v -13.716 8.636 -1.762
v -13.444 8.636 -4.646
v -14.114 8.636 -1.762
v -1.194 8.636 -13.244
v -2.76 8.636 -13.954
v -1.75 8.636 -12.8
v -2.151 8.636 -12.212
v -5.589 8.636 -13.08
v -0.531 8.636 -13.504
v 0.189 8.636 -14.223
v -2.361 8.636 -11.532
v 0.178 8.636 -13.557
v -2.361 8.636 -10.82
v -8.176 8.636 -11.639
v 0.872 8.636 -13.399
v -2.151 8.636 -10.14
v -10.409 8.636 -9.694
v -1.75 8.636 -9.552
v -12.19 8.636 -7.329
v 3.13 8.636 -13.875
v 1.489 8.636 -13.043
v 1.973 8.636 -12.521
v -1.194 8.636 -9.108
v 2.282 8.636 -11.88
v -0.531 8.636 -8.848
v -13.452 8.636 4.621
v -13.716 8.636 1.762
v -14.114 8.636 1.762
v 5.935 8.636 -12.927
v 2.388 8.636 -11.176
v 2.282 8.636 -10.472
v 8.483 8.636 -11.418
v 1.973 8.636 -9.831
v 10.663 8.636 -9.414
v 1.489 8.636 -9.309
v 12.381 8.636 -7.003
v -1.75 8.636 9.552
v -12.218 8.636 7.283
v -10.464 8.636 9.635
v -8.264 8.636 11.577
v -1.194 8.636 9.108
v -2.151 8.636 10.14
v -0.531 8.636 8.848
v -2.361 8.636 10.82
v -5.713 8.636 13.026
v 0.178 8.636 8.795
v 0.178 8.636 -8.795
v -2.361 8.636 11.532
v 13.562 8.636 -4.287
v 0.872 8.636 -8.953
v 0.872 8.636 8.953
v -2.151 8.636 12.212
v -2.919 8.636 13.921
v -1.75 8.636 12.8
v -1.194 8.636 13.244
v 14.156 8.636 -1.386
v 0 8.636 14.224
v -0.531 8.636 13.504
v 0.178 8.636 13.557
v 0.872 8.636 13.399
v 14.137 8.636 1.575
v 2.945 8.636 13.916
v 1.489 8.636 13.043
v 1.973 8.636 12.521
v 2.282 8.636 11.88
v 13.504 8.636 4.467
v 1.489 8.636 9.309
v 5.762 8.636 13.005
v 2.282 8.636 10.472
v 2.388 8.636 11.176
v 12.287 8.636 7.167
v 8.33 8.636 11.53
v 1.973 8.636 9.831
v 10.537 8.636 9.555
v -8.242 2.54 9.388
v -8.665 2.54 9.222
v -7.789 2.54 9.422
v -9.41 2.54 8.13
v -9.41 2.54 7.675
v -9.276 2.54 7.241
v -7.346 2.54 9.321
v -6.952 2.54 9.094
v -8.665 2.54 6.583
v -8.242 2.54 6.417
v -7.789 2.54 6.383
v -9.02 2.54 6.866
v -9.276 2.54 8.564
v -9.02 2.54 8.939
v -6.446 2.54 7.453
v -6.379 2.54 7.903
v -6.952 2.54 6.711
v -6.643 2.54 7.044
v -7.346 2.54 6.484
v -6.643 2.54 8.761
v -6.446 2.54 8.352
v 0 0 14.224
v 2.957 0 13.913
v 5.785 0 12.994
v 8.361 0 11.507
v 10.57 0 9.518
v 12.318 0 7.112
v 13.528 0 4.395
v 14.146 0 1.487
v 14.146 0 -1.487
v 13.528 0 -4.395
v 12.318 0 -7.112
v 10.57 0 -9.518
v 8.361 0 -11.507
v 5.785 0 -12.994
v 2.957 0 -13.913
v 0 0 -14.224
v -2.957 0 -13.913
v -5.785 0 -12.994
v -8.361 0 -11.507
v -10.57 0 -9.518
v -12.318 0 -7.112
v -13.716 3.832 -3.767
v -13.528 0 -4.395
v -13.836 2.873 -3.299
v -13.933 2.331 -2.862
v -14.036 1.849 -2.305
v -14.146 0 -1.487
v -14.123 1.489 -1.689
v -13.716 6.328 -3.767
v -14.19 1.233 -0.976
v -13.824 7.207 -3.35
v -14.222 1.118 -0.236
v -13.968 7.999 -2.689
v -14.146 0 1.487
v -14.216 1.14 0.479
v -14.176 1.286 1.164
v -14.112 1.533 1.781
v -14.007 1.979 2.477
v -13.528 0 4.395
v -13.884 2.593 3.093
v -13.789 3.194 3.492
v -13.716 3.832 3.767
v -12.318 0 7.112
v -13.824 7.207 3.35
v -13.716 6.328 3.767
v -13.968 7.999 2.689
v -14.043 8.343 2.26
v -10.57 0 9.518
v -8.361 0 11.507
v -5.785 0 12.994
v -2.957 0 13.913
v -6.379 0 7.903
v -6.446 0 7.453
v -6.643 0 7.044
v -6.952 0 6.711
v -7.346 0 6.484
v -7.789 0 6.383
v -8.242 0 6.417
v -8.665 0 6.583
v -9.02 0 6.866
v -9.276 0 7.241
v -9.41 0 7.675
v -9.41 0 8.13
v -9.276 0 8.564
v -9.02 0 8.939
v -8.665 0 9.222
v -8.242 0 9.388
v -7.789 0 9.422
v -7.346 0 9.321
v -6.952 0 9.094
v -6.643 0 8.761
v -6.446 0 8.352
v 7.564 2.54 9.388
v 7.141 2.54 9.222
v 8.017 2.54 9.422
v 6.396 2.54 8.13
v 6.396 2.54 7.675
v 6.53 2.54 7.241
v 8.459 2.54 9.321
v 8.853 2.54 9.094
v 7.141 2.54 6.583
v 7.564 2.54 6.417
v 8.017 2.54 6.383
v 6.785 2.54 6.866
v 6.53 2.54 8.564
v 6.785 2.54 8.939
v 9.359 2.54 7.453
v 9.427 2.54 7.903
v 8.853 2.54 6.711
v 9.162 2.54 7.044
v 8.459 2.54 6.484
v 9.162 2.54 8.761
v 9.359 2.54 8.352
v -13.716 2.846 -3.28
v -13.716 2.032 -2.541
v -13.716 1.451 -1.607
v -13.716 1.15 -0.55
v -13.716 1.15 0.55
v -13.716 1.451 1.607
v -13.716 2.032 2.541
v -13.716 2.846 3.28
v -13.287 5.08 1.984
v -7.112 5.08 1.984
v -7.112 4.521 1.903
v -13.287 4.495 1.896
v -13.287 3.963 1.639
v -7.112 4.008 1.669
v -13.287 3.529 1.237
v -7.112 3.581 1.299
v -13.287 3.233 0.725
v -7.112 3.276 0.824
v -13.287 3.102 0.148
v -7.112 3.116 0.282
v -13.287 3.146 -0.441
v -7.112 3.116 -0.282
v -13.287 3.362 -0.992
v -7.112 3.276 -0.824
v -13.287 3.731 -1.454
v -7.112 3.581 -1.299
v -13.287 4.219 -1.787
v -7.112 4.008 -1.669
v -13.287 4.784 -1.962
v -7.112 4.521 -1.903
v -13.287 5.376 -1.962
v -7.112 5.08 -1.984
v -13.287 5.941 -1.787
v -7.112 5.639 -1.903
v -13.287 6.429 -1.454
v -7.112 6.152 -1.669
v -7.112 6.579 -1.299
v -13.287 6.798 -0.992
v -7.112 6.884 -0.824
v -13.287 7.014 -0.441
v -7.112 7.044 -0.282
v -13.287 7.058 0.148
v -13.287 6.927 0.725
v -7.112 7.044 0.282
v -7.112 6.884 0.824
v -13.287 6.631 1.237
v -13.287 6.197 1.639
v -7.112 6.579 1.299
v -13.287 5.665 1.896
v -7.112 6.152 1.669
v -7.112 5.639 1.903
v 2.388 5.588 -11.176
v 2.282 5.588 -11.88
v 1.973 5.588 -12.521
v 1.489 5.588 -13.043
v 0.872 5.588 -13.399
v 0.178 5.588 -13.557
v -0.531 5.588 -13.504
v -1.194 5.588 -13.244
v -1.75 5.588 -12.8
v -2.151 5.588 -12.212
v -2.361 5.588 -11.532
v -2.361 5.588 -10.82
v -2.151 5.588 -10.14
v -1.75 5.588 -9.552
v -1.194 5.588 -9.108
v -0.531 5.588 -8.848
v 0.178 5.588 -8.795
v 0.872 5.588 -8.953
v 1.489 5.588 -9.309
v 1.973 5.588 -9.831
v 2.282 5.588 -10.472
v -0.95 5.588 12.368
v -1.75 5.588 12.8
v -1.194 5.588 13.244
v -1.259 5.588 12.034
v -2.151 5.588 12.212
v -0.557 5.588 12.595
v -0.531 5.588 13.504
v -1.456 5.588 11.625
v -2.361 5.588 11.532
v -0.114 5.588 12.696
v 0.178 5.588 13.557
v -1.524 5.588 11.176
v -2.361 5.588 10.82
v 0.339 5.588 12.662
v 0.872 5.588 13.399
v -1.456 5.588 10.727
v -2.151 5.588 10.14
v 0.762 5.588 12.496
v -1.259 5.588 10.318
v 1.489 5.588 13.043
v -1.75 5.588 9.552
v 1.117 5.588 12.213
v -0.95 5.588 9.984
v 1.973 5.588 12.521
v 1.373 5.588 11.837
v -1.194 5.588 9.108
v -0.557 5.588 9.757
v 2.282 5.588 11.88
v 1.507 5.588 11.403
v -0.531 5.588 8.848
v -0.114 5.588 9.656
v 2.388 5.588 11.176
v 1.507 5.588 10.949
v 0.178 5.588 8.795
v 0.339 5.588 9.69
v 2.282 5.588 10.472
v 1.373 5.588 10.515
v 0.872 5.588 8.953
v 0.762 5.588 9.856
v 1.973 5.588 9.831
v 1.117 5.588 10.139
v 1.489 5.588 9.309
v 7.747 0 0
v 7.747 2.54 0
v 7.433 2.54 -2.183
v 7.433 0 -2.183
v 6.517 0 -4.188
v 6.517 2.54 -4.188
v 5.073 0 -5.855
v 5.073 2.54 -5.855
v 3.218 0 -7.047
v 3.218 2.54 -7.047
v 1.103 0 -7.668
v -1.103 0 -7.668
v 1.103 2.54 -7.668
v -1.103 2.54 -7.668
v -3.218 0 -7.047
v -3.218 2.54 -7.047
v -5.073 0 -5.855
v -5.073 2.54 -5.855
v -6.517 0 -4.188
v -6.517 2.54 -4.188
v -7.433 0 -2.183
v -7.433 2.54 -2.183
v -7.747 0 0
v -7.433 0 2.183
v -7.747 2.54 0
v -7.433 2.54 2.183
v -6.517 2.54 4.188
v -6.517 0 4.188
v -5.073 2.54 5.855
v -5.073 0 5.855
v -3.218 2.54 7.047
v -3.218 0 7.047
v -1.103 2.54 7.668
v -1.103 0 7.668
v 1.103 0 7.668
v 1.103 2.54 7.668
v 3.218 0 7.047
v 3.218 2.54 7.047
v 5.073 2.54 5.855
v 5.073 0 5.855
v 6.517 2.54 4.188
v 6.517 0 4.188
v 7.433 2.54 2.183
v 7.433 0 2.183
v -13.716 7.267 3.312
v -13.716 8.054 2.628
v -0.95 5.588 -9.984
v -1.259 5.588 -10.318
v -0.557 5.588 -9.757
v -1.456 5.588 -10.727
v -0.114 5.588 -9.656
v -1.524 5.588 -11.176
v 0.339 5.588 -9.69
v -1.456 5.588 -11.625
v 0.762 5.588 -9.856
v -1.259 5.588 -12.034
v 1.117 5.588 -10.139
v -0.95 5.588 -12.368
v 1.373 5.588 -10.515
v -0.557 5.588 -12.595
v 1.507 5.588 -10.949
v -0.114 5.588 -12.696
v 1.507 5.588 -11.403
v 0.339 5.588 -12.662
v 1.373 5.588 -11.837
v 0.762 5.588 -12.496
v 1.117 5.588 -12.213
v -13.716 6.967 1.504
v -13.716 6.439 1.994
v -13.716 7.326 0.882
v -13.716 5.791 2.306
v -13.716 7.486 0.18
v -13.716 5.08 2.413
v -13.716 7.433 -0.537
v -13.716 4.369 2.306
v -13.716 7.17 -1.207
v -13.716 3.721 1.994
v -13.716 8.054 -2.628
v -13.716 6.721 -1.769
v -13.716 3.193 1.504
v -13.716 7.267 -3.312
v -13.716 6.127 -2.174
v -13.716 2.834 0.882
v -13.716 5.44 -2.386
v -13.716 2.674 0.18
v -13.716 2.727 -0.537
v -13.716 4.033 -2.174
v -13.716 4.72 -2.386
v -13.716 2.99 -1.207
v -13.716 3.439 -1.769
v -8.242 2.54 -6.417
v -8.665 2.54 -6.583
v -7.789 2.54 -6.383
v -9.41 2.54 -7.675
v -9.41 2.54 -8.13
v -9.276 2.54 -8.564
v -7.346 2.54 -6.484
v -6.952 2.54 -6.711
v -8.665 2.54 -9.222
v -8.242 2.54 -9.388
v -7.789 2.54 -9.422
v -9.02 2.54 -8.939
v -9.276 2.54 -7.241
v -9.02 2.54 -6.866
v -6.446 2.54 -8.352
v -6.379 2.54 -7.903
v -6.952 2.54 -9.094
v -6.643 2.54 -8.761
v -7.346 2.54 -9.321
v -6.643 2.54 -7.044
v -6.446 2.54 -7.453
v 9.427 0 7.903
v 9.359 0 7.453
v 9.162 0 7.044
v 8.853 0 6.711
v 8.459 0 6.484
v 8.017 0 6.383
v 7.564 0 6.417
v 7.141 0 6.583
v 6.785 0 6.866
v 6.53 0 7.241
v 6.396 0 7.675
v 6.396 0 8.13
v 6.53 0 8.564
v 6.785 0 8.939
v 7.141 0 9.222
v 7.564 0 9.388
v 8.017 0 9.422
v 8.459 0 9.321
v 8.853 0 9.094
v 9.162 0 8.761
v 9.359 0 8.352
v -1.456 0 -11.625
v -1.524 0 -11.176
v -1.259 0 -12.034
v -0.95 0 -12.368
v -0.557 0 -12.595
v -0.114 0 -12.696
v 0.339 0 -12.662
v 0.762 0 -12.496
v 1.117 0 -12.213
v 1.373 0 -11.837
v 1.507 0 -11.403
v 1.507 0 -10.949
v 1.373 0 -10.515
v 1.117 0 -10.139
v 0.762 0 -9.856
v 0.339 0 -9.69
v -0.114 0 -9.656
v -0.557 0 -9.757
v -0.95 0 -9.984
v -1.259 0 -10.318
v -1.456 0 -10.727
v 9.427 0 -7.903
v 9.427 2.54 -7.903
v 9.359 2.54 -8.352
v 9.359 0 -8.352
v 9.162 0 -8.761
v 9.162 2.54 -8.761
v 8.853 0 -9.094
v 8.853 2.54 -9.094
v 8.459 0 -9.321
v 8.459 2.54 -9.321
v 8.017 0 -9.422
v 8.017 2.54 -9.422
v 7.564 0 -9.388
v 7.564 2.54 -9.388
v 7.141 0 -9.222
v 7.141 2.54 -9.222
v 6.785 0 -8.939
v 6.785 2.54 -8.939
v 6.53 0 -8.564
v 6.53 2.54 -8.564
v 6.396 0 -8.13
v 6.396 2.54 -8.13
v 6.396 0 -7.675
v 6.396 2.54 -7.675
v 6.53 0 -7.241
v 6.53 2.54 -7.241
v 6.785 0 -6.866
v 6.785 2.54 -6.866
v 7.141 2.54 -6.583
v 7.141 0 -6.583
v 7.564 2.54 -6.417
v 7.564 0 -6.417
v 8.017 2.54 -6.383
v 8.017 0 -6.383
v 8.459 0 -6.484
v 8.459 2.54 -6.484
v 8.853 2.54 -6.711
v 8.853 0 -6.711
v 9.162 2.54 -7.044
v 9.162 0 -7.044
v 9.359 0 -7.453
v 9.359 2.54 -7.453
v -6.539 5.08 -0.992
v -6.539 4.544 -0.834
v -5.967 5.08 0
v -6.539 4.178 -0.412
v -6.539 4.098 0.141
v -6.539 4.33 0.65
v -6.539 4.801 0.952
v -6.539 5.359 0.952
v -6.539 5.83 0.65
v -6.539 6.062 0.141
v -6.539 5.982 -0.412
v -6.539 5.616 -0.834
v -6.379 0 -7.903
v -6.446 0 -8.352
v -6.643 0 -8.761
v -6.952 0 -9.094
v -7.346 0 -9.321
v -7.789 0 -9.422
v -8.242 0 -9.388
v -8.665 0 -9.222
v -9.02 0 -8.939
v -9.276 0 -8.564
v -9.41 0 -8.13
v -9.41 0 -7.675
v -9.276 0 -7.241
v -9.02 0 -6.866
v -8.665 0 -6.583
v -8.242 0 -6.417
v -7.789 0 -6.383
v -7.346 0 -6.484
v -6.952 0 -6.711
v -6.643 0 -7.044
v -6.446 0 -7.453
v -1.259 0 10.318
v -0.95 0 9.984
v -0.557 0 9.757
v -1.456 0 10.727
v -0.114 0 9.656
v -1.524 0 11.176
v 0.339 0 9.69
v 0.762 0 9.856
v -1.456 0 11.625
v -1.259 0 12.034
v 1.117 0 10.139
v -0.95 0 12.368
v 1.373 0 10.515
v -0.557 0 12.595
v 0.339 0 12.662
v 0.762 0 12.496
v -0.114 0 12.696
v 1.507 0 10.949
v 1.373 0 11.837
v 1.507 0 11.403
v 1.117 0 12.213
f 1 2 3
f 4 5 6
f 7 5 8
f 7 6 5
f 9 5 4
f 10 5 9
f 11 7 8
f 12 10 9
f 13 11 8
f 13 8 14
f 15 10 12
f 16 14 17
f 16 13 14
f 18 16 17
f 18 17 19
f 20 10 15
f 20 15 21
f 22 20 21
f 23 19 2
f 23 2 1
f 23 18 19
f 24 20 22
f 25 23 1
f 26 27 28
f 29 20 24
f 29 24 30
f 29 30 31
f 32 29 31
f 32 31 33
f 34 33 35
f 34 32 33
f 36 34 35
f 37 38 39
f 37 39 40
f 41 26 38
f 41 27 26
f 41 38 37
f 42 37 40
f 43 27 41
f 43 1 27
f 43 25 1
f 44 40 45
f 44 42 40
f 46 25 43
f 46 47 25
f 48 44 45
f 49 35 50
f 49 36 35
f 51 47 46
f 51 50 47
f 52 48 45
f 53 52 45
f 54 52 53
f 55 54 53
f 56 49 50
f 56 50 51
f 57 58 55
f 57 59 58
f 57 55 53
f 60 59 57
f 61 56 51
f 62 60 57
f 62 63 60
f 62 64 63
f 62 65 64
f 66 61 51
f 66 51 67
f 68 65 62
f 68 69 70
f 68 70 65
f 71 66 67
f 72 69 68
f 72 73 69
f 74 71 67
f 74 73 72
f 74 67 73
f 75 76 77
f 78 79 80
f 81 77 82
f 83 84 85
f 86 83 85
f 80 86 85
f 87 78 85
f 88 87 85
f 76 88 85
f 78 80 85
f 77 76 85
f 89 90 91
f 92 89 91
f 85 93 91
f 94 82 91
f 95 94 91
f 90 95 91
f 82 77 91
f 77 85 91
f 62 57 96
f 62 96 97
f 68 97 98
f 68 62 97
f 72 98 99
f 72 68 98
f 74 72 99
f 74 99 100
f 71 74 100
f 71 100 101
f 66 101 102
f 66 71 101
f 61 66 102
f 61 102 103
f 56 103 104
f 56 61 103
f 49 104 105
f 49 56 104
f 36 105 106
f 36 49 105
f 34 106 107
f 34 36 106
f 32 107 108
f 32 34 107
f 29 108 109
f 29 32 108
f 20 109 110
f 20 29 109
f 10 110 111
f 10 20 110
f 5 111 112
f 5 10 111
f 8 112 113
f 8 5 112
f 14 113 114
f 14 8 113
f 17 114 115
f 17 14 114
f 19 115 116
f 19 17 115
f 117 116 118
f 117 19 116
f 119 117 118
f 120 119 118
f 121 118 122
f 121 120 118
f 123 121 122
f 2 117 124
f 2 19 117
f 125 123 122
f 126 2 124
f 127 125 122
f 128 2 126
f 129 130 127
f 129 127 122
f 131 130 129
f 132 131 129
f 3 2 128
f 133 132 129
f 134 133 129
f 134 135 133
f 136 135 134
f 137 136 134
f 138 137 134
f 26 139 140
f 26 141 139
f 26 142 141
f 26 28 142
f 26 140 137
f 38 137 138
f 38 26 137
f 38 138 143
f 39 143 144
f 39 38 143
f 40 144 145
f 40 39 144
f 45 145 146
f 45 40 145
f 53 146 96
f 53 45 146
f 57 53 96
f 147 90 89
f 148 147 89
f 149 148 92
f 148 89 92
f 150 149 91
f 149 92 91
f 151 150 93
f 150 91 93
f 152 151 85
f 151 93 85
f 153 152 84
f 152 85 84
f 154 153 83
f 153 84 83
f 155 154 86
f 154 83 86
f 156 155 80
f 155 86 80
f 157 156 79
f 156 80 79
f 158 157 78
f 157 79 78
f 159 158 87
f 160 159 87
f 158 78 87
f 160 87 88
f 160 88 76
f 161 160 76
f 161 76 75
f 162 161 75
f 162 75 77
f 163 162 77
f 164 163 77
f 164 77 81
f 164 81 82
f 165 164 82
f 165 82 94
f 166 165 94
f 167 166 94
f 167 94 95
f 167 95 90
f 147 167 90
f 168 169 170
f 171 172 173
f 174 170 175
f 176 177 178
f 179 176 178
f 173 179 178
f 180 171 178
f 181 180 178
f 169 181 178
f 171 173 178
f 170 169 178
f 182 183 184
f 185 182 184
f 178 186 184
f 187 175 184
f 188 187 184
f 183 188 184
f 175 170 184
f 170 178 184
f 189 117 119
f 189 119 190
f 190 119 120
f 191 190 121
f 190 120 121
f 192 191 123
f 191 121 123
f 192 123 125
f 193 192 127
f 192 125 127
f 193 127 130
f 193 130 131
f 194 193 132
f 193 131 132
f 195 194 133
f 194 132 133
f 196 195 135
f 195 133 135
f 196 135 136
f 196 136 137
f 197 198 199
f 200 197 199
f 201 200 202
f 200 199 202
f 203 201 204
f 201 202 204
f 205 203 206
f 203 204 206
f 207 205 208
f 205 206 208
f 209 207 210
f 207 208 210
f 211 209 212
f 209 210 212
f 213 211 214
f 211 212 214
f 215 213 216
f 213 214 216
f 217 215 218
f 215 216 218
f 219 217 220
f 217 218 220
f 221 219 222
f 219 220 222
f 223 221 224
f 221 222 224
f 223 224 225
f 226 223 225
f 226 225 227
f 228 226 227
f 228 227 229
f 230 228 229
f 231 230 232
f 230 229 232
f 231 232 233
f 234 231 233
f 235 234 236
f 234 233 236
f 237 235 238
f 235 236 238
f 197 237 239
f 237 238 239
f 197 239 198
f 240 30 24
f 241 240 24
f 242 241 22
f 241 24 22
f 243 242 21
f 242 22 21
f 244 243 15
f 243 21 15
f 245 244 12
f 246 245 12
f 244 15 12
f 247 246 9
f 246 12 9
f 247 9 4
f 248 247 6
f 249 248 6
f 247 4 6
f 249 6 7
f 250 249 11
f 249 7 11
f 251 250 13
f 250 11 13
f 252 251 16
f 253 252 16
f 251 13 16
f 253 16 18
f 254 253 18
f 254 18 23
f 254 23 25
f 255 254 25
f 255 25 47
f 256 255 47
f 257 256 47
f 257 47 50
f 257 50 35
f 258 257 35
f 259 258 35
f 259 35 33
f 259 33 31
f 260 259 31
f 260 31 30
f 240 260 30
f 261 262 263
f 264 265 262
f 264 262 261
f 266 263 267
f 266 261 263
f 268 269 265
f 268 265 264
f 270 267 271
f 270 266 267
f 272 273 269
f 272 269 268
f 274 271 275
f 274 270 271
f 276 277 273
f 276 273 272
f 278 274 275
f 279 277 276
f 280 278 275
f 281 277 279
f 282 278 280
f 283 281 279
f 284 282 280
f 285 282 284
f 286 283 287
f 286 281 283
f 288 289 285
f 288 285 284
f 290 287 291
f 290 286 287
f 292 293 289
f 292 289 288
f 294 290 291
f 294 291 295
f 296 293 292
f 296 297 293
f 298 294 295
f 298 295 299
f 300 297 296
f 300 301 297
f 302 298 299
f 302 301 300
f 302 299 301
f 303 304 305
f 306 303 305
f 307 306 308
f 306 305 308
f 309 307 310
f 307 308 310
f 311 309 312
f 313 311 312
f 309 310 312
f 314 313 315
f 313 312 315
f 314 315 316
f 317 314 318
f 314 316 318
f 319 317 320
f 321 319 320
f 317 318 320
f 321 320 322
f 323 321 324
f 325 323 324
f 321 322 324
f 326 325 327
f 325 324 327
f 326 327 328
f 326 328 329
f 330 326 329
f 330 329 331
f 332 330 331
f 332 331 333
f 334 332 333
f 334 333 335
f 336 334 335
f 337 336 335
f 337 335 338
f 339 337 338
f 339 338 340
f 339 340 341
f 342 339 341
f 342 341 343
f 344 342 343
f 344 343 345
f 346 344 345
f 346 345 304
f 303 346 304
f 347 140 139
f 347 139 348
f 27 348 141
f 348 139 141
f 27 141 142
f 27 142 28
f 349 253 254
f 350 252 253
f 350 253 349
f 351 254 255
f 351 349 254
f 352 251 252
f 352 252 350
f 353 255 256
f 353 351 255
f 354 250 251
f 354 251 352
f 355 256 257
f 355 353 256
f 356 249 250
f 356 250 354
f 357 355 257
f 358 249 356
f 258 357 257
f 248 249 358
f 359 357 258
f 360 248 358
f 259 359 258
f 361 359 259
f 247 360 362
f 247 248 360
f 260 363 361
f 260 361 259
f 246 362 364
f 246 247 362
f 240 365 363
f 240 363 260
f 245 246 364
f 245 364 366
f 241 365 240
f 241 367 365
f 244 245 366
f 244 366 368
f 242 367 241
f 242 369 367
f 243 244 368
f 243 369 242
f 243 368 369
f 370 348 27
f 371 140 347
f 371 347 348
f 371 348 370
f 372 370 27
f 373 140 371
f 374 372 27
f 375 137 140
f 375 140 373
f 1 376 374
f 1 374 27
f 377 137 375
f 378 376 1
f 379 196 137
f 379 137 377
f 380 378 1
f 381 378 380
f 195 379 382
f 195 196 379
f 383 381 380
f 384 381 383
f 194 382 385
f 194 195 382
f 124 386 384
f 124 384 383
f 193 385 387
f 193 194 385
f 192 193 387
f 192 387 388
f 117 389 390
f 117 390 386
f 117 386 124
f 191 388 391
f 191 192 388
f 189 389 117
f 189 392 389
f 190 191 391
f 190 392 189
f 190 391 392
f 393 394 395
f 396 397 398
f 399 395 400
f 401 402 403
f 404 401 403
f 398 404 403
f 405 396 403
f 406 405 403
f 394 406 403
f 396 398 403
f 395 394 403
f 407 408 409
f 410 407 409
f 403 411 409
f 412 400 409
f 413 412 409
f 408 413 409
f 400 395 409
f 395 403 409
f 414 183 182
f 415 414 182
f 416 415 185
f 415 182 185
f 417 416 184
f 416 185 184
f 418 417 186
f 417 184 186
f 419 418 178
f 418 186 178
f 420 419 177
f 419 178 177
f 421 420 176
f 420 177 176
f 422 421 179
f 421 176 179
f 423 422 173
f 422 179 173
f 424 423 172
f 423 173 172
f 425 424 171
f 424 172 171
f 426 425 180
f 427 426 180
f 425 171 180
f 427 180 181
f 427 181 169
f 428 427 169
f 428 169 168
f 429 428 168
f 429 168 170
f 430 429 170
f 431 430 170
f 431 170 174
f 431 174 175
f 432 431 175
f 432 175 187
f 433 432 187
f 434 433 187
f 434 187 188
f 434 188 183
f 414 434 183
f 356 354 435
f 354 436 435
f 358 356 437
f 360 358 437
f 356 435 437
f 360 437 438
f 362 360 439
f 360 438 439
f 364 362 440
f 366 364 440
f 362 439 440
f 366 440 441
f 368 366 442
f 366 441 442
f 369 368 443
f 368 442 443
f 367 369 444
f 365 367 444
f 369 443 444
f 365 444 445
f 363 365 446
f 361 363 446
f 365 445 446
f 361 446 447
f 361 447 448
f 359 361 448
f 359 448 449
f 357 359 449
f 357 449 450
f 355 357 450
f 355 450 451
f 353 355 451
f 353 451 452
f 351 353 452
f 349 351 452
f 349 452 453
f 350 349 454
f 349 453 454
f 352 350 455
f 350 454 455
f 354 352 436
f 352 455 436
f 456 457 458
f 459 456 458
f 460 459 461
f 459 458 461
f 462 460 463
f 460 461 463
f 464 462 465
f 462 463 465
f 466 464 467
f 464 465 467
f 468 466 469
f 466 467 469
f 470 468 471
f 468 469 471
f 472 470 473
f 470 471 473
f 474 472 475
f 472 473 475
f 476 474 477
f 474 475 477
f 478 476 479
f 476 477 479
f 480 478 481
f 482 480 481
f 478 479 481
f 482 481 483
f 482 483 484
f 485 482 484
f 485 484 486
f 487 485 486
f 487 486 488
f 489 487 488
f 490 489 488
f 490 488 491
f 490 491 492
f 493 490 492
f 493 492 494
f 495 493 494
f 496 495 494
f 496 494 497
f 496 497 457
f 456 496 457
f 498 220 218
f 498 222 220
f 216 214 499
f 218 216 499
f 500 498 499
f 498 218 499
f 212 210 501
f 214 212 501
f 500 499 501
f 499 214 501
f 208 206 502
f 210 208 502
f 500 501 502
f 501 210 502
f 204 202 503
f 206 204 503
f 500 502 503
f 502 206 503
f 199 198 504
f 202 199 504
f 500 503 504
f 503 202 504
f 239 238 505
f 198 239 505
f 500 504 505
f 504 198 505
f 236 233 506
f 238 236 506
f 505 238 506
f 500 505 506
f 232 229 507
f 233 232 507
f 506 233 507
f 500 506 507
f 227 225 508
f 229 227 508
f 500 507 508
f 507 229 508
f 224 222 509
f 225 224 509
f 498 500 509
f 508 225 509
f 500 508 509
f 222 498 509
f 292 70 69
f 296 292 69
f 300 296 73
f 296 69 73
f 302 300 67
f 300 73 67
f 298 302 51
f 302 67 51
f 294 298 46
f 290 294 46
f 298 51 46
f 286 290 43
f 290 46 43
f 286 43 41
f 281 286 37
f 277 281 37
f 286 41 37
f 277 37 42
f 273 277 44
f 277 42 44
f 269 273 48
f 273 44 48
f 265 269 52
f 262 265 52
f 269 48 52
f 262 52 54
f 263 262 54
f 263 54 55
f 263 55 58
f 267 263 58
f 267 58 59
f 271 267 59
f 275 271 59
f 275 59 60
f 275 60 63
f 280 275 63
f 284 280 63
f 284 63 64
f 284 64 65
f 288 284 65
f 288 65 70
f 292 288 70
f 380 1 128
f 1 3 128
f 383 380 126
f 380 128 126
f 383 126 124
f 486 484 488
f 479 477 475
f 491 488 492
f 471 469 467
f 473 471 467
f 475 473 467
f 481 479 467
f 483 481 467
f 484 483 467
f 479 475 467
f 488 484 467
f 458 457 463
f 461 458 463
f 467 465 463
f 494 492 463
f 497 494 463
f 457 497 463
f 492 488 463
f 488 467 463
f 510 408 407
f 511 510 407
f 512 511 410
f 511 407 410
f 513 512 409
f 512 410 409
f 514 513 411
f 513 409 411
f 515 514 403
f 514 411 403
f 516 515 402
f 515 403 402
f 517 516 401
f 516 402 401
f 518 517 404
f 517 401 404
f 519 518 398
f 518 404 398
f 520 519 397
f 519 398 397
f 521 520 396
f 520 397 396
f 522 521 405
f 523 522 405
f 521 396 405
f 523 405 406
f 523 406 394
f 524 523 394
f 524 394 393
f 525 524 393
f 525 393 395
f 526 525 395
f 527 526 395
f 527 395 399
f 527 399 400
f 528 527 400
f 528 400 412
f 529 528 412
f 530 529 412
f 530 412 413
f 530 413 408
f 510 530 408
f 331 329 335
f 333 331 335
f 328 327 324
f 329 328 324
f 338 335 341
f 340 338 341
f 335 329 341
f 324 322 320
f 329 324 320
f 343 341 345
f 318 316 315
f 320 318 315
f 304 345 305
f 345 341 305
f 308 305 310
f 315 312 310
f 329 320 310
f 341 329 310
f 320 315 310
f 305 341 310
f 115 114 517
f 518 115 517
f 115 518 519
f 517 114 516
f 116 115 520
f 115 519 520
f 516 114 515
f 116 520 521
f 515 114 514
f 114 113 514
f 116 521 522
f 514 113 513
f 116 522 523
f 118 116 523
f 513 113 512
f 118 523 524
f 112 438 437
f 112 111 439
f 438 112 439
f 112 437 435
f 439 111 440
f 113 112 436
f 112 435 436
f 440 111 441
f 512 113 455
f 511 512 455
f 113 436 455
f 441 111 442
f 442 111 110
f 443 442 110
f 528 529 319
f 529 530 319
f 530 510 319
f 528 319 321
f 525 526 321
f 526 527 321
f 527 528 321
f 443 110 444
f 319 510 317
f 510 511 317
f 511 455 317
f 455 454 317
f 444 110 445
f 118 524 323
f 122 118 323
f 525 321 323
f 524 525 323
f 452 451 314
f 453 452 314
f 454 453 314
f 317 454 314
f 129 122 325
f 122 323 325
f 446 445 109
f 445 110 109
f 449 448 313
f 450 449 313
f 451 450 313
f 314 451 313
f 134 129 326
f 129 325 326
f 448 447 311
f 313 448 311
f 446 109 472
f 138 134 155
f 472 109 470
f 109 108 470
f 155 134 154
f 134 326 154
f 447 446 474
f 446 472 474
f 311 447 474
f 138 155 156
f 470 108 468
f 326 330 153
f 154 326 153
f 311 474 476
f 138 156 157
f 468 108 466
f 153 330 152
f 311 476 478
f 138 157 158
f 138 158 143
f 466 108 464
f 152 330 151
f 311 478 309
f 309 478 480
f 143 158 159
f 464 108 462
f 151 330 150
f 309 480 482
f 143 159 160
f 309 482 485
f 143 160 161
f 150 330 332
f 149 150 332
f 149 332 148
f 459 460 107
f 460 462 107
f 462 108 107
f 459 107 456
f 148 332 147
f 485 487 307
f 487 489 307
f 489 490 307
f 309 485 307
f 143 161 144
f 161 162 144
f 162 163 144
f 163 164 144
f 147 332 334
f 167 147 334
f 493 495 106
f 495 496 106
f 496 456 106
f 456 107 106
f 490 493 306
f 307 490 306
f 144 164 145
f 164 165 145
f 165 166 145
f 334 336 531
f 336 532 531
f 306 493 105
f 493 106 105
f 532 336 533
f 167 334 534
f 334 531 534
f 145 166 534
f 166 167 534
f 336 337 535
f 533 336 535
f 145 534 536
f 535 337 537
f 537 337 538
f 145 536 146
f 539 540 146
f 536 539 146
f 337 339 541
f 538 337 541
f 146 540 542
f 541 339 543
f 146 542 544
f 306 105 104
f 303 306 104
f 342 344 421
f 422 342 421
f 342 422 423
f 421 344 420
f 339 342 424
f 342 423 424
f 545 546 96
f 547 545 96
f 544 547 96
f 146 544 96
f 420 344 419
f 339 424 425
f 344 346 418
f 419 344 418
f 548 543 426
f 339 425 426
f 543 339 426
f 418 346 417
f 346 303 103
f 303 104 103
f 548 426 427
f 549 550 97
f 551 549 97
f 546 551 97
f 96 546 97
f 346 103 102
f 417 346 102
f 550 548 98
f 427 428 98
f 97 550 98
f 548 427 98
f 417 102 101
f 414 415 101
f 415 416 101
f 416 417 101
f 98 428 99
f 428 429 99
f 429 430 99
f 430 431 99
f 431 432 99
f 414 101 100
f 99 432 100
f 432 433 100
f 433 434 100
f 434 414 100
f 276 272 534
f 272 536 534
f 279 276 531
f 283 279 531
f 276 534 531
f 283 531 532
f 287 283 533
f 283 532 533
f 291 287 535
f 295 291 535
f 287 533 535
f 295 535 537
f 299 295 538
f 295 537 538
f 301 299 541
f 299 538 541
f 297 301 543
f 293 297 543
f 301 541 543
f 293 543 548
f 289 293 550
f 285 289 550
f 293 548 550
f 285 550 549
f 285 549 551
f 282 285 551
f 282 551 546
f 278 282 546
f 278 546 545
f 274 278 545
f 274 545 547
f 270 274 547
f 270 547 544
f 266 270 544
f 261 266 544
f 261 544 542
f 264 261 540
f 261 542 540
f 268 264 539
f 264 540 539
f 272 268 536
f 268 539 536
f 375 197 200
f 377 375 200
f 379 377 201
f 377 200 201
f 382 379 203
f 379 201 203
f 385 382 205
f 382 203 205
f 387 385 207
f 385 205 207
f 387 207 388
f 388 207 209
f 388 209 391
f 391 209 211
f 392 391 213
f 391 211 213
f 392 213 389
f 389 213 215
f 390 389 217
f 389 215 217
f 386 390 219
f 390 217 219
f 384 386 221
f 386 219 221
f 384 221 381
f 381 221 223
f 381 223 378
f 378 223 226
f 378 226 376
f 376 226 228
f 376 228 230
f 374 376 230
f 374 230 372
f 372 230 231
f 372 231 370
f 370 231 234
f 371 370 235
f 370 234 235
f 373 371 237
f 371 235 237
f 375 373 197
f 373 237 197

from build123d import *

# Parameters (mm, degrees)
SKETCH1_W                                          = 14.224
SKETCH1_H                                          = 8.636
CBORE_FOR_M2_5_HEX_HEAD_MACHINE_SCREW1_D           = 3.048
CBORE_FOR_M2_5_HEX_HEAD_MACHINE_SCREW1_CBORE_D     = 4.7752
CBORE_FOR_M2_5_HEX_HEAD_MACHINE_SCREW1_CBORE_DEPTH = 3.048
M2_5_CLEARANCE_HOLE1_D                             = 3.048
M2_5_CLEARANCE_HOLE1_DEPTH                         = 2.54
M13_CLEARANCE_HOLE1_D                              = 15.494
M13_CLEARANCE_HOLE1_DEPTH                          = 2.54
CBORE_FOR_M3_5_HEX_HEAD_MACHINE_SCREW1_D           = 3.96748
CBORE_FOR_M3_5_HEX_HEAD_MACHINE_SCREW1_DEPTH       = 7.112
CBORE_FOR_M3_5_HEX_HEAD_MACHINE_SCREW1_CBORE_D     = 7.9375
CBORE_FOR_M3_5_HEX_HEAD_MACHINE_SCREW1_CBORE_DEPTH = 0.508
CBORE_FOR_M3_5_HEX_HEAD_MACHINE_SCREW1_TIP         = 1.145312823
CHAMFER1_SIZE                                      = 0.42926


with BuildPart() as part:
    # Sketch1 → Revolve1 (revolve)
    with BuildSketch(Plane(origin=(0, 0, 0), x_dir=(-1, 0, 0), z_dir=(0, 0, -1)), mode=Mode.PRIVATE) as revolve1_sk:
        with Locations((-7.112, 4.318)):
            Rectangle(SKETCH1_W, SKETCH1_H)
    revolve(revolve1_sk.sketch.rotate(Axis((0, 0, 0), (0, 1, 0)), 270), axis=Axis((0, 0, 0), (0, 1, 0)))

    # CBORE for M2.5 Hex Head Machine Screw1 (through all)
    with Locations(Plane(origin=(0, 8.636, 0), x_dir=(1, 0, 0), z_dir=(0, 1, 0))):
        with Locations((0, -11.176), (0, 11.176)):
            CounterBoreHole(CBORE_FOR_M2_5_HEX_HEAD_MACHINE_SCREW1_D / 2, CBORE_FOR_M2_5_HEX_HEAD_MACHINE_SCREW1_CBORE_D / 2, CBORE_FOR_M2_5_HEX_HEAD_MACHINE_SCREW1_CBORE_DEPTH)

    # M2.5 Clearance Hole1
    with Locations(Plane(origin=(0, 0, 0), x_dir=(-1, 0, 0), z_dir=(0, -1, 0))):
        with Locations((-7.902625387, 7.902625387), (7.902625387, -7.902625387), (-7.902625387, -7.902625387), (7.902625387, 7.902625387)):
            Hole(M2_5_CLEARANCE_HOLE1_D / 2, depth=M2_5_CLEARANCE_HOLE1_DEPTH)

    # M13 Clearance Hole1
    with Locations(Plane(origin=(0, 0, 0), x_dir=(-1, 0, 0), z_dir=(0, -1, 0))):
        with Locations((0, 0)):
            Hole(M13_CLEARANCE_HOLE1_D / 2, depth=M13_CLEARANCE_HOLE1_DEPTH)

    # CBORE for M3.5 Hex Head Machine Screw1
    with Locations(Plane(origin=(-14.224, 5.08, 0), x_dir=(0, 0, -1), z_dir=(-1, 0, 0))):
        with Locations((0, 0)):
            CounterBoreHole(CBORE_FOR_M3_5_HEX_HEAD_MACHINE_SCREW1_D / 2, CBORE_FOR_M3_5_HEX_HEAD_MACHINE_SCREW1_CBORE_D / 2, CBORE_FOR_M3_5_HEX_HEAD_MACHINE_SCREW1_CBORE_DEPTH, depth=CBORE_FOR_M3_5_HEX_HEAD_MACHINE_SCREW1_DEPTH)
            with Locations((0, 0, -(CBORE_FOR_M3_5_HEX_HEAD_MACHINE_SCREW1_DEPTH + CBORE_FOR_M3_5_HEX_HEAD_MACHINE_SCREW1_TIP / 2))):  # 120° drill point
                Cone(0, CBORE_FOR_M3_5_HEX_HEAD_MACHINE_SCREW1_D / 2, CBORE_FOR_M3_5_HEX_HEAD_MACHINE_SCREW1_TIP, mode=Mode.SUBTRACT)

    # Chamfer1
    chamfer1_edges = [part.edges().sort_by_distance(p)[0] for p in [
        (-13.716, 5.08, -1.98374),
    ]]
    chamfer(chamfer1_edges, length=CHAMFER1_SIZE)


solid = part.part
